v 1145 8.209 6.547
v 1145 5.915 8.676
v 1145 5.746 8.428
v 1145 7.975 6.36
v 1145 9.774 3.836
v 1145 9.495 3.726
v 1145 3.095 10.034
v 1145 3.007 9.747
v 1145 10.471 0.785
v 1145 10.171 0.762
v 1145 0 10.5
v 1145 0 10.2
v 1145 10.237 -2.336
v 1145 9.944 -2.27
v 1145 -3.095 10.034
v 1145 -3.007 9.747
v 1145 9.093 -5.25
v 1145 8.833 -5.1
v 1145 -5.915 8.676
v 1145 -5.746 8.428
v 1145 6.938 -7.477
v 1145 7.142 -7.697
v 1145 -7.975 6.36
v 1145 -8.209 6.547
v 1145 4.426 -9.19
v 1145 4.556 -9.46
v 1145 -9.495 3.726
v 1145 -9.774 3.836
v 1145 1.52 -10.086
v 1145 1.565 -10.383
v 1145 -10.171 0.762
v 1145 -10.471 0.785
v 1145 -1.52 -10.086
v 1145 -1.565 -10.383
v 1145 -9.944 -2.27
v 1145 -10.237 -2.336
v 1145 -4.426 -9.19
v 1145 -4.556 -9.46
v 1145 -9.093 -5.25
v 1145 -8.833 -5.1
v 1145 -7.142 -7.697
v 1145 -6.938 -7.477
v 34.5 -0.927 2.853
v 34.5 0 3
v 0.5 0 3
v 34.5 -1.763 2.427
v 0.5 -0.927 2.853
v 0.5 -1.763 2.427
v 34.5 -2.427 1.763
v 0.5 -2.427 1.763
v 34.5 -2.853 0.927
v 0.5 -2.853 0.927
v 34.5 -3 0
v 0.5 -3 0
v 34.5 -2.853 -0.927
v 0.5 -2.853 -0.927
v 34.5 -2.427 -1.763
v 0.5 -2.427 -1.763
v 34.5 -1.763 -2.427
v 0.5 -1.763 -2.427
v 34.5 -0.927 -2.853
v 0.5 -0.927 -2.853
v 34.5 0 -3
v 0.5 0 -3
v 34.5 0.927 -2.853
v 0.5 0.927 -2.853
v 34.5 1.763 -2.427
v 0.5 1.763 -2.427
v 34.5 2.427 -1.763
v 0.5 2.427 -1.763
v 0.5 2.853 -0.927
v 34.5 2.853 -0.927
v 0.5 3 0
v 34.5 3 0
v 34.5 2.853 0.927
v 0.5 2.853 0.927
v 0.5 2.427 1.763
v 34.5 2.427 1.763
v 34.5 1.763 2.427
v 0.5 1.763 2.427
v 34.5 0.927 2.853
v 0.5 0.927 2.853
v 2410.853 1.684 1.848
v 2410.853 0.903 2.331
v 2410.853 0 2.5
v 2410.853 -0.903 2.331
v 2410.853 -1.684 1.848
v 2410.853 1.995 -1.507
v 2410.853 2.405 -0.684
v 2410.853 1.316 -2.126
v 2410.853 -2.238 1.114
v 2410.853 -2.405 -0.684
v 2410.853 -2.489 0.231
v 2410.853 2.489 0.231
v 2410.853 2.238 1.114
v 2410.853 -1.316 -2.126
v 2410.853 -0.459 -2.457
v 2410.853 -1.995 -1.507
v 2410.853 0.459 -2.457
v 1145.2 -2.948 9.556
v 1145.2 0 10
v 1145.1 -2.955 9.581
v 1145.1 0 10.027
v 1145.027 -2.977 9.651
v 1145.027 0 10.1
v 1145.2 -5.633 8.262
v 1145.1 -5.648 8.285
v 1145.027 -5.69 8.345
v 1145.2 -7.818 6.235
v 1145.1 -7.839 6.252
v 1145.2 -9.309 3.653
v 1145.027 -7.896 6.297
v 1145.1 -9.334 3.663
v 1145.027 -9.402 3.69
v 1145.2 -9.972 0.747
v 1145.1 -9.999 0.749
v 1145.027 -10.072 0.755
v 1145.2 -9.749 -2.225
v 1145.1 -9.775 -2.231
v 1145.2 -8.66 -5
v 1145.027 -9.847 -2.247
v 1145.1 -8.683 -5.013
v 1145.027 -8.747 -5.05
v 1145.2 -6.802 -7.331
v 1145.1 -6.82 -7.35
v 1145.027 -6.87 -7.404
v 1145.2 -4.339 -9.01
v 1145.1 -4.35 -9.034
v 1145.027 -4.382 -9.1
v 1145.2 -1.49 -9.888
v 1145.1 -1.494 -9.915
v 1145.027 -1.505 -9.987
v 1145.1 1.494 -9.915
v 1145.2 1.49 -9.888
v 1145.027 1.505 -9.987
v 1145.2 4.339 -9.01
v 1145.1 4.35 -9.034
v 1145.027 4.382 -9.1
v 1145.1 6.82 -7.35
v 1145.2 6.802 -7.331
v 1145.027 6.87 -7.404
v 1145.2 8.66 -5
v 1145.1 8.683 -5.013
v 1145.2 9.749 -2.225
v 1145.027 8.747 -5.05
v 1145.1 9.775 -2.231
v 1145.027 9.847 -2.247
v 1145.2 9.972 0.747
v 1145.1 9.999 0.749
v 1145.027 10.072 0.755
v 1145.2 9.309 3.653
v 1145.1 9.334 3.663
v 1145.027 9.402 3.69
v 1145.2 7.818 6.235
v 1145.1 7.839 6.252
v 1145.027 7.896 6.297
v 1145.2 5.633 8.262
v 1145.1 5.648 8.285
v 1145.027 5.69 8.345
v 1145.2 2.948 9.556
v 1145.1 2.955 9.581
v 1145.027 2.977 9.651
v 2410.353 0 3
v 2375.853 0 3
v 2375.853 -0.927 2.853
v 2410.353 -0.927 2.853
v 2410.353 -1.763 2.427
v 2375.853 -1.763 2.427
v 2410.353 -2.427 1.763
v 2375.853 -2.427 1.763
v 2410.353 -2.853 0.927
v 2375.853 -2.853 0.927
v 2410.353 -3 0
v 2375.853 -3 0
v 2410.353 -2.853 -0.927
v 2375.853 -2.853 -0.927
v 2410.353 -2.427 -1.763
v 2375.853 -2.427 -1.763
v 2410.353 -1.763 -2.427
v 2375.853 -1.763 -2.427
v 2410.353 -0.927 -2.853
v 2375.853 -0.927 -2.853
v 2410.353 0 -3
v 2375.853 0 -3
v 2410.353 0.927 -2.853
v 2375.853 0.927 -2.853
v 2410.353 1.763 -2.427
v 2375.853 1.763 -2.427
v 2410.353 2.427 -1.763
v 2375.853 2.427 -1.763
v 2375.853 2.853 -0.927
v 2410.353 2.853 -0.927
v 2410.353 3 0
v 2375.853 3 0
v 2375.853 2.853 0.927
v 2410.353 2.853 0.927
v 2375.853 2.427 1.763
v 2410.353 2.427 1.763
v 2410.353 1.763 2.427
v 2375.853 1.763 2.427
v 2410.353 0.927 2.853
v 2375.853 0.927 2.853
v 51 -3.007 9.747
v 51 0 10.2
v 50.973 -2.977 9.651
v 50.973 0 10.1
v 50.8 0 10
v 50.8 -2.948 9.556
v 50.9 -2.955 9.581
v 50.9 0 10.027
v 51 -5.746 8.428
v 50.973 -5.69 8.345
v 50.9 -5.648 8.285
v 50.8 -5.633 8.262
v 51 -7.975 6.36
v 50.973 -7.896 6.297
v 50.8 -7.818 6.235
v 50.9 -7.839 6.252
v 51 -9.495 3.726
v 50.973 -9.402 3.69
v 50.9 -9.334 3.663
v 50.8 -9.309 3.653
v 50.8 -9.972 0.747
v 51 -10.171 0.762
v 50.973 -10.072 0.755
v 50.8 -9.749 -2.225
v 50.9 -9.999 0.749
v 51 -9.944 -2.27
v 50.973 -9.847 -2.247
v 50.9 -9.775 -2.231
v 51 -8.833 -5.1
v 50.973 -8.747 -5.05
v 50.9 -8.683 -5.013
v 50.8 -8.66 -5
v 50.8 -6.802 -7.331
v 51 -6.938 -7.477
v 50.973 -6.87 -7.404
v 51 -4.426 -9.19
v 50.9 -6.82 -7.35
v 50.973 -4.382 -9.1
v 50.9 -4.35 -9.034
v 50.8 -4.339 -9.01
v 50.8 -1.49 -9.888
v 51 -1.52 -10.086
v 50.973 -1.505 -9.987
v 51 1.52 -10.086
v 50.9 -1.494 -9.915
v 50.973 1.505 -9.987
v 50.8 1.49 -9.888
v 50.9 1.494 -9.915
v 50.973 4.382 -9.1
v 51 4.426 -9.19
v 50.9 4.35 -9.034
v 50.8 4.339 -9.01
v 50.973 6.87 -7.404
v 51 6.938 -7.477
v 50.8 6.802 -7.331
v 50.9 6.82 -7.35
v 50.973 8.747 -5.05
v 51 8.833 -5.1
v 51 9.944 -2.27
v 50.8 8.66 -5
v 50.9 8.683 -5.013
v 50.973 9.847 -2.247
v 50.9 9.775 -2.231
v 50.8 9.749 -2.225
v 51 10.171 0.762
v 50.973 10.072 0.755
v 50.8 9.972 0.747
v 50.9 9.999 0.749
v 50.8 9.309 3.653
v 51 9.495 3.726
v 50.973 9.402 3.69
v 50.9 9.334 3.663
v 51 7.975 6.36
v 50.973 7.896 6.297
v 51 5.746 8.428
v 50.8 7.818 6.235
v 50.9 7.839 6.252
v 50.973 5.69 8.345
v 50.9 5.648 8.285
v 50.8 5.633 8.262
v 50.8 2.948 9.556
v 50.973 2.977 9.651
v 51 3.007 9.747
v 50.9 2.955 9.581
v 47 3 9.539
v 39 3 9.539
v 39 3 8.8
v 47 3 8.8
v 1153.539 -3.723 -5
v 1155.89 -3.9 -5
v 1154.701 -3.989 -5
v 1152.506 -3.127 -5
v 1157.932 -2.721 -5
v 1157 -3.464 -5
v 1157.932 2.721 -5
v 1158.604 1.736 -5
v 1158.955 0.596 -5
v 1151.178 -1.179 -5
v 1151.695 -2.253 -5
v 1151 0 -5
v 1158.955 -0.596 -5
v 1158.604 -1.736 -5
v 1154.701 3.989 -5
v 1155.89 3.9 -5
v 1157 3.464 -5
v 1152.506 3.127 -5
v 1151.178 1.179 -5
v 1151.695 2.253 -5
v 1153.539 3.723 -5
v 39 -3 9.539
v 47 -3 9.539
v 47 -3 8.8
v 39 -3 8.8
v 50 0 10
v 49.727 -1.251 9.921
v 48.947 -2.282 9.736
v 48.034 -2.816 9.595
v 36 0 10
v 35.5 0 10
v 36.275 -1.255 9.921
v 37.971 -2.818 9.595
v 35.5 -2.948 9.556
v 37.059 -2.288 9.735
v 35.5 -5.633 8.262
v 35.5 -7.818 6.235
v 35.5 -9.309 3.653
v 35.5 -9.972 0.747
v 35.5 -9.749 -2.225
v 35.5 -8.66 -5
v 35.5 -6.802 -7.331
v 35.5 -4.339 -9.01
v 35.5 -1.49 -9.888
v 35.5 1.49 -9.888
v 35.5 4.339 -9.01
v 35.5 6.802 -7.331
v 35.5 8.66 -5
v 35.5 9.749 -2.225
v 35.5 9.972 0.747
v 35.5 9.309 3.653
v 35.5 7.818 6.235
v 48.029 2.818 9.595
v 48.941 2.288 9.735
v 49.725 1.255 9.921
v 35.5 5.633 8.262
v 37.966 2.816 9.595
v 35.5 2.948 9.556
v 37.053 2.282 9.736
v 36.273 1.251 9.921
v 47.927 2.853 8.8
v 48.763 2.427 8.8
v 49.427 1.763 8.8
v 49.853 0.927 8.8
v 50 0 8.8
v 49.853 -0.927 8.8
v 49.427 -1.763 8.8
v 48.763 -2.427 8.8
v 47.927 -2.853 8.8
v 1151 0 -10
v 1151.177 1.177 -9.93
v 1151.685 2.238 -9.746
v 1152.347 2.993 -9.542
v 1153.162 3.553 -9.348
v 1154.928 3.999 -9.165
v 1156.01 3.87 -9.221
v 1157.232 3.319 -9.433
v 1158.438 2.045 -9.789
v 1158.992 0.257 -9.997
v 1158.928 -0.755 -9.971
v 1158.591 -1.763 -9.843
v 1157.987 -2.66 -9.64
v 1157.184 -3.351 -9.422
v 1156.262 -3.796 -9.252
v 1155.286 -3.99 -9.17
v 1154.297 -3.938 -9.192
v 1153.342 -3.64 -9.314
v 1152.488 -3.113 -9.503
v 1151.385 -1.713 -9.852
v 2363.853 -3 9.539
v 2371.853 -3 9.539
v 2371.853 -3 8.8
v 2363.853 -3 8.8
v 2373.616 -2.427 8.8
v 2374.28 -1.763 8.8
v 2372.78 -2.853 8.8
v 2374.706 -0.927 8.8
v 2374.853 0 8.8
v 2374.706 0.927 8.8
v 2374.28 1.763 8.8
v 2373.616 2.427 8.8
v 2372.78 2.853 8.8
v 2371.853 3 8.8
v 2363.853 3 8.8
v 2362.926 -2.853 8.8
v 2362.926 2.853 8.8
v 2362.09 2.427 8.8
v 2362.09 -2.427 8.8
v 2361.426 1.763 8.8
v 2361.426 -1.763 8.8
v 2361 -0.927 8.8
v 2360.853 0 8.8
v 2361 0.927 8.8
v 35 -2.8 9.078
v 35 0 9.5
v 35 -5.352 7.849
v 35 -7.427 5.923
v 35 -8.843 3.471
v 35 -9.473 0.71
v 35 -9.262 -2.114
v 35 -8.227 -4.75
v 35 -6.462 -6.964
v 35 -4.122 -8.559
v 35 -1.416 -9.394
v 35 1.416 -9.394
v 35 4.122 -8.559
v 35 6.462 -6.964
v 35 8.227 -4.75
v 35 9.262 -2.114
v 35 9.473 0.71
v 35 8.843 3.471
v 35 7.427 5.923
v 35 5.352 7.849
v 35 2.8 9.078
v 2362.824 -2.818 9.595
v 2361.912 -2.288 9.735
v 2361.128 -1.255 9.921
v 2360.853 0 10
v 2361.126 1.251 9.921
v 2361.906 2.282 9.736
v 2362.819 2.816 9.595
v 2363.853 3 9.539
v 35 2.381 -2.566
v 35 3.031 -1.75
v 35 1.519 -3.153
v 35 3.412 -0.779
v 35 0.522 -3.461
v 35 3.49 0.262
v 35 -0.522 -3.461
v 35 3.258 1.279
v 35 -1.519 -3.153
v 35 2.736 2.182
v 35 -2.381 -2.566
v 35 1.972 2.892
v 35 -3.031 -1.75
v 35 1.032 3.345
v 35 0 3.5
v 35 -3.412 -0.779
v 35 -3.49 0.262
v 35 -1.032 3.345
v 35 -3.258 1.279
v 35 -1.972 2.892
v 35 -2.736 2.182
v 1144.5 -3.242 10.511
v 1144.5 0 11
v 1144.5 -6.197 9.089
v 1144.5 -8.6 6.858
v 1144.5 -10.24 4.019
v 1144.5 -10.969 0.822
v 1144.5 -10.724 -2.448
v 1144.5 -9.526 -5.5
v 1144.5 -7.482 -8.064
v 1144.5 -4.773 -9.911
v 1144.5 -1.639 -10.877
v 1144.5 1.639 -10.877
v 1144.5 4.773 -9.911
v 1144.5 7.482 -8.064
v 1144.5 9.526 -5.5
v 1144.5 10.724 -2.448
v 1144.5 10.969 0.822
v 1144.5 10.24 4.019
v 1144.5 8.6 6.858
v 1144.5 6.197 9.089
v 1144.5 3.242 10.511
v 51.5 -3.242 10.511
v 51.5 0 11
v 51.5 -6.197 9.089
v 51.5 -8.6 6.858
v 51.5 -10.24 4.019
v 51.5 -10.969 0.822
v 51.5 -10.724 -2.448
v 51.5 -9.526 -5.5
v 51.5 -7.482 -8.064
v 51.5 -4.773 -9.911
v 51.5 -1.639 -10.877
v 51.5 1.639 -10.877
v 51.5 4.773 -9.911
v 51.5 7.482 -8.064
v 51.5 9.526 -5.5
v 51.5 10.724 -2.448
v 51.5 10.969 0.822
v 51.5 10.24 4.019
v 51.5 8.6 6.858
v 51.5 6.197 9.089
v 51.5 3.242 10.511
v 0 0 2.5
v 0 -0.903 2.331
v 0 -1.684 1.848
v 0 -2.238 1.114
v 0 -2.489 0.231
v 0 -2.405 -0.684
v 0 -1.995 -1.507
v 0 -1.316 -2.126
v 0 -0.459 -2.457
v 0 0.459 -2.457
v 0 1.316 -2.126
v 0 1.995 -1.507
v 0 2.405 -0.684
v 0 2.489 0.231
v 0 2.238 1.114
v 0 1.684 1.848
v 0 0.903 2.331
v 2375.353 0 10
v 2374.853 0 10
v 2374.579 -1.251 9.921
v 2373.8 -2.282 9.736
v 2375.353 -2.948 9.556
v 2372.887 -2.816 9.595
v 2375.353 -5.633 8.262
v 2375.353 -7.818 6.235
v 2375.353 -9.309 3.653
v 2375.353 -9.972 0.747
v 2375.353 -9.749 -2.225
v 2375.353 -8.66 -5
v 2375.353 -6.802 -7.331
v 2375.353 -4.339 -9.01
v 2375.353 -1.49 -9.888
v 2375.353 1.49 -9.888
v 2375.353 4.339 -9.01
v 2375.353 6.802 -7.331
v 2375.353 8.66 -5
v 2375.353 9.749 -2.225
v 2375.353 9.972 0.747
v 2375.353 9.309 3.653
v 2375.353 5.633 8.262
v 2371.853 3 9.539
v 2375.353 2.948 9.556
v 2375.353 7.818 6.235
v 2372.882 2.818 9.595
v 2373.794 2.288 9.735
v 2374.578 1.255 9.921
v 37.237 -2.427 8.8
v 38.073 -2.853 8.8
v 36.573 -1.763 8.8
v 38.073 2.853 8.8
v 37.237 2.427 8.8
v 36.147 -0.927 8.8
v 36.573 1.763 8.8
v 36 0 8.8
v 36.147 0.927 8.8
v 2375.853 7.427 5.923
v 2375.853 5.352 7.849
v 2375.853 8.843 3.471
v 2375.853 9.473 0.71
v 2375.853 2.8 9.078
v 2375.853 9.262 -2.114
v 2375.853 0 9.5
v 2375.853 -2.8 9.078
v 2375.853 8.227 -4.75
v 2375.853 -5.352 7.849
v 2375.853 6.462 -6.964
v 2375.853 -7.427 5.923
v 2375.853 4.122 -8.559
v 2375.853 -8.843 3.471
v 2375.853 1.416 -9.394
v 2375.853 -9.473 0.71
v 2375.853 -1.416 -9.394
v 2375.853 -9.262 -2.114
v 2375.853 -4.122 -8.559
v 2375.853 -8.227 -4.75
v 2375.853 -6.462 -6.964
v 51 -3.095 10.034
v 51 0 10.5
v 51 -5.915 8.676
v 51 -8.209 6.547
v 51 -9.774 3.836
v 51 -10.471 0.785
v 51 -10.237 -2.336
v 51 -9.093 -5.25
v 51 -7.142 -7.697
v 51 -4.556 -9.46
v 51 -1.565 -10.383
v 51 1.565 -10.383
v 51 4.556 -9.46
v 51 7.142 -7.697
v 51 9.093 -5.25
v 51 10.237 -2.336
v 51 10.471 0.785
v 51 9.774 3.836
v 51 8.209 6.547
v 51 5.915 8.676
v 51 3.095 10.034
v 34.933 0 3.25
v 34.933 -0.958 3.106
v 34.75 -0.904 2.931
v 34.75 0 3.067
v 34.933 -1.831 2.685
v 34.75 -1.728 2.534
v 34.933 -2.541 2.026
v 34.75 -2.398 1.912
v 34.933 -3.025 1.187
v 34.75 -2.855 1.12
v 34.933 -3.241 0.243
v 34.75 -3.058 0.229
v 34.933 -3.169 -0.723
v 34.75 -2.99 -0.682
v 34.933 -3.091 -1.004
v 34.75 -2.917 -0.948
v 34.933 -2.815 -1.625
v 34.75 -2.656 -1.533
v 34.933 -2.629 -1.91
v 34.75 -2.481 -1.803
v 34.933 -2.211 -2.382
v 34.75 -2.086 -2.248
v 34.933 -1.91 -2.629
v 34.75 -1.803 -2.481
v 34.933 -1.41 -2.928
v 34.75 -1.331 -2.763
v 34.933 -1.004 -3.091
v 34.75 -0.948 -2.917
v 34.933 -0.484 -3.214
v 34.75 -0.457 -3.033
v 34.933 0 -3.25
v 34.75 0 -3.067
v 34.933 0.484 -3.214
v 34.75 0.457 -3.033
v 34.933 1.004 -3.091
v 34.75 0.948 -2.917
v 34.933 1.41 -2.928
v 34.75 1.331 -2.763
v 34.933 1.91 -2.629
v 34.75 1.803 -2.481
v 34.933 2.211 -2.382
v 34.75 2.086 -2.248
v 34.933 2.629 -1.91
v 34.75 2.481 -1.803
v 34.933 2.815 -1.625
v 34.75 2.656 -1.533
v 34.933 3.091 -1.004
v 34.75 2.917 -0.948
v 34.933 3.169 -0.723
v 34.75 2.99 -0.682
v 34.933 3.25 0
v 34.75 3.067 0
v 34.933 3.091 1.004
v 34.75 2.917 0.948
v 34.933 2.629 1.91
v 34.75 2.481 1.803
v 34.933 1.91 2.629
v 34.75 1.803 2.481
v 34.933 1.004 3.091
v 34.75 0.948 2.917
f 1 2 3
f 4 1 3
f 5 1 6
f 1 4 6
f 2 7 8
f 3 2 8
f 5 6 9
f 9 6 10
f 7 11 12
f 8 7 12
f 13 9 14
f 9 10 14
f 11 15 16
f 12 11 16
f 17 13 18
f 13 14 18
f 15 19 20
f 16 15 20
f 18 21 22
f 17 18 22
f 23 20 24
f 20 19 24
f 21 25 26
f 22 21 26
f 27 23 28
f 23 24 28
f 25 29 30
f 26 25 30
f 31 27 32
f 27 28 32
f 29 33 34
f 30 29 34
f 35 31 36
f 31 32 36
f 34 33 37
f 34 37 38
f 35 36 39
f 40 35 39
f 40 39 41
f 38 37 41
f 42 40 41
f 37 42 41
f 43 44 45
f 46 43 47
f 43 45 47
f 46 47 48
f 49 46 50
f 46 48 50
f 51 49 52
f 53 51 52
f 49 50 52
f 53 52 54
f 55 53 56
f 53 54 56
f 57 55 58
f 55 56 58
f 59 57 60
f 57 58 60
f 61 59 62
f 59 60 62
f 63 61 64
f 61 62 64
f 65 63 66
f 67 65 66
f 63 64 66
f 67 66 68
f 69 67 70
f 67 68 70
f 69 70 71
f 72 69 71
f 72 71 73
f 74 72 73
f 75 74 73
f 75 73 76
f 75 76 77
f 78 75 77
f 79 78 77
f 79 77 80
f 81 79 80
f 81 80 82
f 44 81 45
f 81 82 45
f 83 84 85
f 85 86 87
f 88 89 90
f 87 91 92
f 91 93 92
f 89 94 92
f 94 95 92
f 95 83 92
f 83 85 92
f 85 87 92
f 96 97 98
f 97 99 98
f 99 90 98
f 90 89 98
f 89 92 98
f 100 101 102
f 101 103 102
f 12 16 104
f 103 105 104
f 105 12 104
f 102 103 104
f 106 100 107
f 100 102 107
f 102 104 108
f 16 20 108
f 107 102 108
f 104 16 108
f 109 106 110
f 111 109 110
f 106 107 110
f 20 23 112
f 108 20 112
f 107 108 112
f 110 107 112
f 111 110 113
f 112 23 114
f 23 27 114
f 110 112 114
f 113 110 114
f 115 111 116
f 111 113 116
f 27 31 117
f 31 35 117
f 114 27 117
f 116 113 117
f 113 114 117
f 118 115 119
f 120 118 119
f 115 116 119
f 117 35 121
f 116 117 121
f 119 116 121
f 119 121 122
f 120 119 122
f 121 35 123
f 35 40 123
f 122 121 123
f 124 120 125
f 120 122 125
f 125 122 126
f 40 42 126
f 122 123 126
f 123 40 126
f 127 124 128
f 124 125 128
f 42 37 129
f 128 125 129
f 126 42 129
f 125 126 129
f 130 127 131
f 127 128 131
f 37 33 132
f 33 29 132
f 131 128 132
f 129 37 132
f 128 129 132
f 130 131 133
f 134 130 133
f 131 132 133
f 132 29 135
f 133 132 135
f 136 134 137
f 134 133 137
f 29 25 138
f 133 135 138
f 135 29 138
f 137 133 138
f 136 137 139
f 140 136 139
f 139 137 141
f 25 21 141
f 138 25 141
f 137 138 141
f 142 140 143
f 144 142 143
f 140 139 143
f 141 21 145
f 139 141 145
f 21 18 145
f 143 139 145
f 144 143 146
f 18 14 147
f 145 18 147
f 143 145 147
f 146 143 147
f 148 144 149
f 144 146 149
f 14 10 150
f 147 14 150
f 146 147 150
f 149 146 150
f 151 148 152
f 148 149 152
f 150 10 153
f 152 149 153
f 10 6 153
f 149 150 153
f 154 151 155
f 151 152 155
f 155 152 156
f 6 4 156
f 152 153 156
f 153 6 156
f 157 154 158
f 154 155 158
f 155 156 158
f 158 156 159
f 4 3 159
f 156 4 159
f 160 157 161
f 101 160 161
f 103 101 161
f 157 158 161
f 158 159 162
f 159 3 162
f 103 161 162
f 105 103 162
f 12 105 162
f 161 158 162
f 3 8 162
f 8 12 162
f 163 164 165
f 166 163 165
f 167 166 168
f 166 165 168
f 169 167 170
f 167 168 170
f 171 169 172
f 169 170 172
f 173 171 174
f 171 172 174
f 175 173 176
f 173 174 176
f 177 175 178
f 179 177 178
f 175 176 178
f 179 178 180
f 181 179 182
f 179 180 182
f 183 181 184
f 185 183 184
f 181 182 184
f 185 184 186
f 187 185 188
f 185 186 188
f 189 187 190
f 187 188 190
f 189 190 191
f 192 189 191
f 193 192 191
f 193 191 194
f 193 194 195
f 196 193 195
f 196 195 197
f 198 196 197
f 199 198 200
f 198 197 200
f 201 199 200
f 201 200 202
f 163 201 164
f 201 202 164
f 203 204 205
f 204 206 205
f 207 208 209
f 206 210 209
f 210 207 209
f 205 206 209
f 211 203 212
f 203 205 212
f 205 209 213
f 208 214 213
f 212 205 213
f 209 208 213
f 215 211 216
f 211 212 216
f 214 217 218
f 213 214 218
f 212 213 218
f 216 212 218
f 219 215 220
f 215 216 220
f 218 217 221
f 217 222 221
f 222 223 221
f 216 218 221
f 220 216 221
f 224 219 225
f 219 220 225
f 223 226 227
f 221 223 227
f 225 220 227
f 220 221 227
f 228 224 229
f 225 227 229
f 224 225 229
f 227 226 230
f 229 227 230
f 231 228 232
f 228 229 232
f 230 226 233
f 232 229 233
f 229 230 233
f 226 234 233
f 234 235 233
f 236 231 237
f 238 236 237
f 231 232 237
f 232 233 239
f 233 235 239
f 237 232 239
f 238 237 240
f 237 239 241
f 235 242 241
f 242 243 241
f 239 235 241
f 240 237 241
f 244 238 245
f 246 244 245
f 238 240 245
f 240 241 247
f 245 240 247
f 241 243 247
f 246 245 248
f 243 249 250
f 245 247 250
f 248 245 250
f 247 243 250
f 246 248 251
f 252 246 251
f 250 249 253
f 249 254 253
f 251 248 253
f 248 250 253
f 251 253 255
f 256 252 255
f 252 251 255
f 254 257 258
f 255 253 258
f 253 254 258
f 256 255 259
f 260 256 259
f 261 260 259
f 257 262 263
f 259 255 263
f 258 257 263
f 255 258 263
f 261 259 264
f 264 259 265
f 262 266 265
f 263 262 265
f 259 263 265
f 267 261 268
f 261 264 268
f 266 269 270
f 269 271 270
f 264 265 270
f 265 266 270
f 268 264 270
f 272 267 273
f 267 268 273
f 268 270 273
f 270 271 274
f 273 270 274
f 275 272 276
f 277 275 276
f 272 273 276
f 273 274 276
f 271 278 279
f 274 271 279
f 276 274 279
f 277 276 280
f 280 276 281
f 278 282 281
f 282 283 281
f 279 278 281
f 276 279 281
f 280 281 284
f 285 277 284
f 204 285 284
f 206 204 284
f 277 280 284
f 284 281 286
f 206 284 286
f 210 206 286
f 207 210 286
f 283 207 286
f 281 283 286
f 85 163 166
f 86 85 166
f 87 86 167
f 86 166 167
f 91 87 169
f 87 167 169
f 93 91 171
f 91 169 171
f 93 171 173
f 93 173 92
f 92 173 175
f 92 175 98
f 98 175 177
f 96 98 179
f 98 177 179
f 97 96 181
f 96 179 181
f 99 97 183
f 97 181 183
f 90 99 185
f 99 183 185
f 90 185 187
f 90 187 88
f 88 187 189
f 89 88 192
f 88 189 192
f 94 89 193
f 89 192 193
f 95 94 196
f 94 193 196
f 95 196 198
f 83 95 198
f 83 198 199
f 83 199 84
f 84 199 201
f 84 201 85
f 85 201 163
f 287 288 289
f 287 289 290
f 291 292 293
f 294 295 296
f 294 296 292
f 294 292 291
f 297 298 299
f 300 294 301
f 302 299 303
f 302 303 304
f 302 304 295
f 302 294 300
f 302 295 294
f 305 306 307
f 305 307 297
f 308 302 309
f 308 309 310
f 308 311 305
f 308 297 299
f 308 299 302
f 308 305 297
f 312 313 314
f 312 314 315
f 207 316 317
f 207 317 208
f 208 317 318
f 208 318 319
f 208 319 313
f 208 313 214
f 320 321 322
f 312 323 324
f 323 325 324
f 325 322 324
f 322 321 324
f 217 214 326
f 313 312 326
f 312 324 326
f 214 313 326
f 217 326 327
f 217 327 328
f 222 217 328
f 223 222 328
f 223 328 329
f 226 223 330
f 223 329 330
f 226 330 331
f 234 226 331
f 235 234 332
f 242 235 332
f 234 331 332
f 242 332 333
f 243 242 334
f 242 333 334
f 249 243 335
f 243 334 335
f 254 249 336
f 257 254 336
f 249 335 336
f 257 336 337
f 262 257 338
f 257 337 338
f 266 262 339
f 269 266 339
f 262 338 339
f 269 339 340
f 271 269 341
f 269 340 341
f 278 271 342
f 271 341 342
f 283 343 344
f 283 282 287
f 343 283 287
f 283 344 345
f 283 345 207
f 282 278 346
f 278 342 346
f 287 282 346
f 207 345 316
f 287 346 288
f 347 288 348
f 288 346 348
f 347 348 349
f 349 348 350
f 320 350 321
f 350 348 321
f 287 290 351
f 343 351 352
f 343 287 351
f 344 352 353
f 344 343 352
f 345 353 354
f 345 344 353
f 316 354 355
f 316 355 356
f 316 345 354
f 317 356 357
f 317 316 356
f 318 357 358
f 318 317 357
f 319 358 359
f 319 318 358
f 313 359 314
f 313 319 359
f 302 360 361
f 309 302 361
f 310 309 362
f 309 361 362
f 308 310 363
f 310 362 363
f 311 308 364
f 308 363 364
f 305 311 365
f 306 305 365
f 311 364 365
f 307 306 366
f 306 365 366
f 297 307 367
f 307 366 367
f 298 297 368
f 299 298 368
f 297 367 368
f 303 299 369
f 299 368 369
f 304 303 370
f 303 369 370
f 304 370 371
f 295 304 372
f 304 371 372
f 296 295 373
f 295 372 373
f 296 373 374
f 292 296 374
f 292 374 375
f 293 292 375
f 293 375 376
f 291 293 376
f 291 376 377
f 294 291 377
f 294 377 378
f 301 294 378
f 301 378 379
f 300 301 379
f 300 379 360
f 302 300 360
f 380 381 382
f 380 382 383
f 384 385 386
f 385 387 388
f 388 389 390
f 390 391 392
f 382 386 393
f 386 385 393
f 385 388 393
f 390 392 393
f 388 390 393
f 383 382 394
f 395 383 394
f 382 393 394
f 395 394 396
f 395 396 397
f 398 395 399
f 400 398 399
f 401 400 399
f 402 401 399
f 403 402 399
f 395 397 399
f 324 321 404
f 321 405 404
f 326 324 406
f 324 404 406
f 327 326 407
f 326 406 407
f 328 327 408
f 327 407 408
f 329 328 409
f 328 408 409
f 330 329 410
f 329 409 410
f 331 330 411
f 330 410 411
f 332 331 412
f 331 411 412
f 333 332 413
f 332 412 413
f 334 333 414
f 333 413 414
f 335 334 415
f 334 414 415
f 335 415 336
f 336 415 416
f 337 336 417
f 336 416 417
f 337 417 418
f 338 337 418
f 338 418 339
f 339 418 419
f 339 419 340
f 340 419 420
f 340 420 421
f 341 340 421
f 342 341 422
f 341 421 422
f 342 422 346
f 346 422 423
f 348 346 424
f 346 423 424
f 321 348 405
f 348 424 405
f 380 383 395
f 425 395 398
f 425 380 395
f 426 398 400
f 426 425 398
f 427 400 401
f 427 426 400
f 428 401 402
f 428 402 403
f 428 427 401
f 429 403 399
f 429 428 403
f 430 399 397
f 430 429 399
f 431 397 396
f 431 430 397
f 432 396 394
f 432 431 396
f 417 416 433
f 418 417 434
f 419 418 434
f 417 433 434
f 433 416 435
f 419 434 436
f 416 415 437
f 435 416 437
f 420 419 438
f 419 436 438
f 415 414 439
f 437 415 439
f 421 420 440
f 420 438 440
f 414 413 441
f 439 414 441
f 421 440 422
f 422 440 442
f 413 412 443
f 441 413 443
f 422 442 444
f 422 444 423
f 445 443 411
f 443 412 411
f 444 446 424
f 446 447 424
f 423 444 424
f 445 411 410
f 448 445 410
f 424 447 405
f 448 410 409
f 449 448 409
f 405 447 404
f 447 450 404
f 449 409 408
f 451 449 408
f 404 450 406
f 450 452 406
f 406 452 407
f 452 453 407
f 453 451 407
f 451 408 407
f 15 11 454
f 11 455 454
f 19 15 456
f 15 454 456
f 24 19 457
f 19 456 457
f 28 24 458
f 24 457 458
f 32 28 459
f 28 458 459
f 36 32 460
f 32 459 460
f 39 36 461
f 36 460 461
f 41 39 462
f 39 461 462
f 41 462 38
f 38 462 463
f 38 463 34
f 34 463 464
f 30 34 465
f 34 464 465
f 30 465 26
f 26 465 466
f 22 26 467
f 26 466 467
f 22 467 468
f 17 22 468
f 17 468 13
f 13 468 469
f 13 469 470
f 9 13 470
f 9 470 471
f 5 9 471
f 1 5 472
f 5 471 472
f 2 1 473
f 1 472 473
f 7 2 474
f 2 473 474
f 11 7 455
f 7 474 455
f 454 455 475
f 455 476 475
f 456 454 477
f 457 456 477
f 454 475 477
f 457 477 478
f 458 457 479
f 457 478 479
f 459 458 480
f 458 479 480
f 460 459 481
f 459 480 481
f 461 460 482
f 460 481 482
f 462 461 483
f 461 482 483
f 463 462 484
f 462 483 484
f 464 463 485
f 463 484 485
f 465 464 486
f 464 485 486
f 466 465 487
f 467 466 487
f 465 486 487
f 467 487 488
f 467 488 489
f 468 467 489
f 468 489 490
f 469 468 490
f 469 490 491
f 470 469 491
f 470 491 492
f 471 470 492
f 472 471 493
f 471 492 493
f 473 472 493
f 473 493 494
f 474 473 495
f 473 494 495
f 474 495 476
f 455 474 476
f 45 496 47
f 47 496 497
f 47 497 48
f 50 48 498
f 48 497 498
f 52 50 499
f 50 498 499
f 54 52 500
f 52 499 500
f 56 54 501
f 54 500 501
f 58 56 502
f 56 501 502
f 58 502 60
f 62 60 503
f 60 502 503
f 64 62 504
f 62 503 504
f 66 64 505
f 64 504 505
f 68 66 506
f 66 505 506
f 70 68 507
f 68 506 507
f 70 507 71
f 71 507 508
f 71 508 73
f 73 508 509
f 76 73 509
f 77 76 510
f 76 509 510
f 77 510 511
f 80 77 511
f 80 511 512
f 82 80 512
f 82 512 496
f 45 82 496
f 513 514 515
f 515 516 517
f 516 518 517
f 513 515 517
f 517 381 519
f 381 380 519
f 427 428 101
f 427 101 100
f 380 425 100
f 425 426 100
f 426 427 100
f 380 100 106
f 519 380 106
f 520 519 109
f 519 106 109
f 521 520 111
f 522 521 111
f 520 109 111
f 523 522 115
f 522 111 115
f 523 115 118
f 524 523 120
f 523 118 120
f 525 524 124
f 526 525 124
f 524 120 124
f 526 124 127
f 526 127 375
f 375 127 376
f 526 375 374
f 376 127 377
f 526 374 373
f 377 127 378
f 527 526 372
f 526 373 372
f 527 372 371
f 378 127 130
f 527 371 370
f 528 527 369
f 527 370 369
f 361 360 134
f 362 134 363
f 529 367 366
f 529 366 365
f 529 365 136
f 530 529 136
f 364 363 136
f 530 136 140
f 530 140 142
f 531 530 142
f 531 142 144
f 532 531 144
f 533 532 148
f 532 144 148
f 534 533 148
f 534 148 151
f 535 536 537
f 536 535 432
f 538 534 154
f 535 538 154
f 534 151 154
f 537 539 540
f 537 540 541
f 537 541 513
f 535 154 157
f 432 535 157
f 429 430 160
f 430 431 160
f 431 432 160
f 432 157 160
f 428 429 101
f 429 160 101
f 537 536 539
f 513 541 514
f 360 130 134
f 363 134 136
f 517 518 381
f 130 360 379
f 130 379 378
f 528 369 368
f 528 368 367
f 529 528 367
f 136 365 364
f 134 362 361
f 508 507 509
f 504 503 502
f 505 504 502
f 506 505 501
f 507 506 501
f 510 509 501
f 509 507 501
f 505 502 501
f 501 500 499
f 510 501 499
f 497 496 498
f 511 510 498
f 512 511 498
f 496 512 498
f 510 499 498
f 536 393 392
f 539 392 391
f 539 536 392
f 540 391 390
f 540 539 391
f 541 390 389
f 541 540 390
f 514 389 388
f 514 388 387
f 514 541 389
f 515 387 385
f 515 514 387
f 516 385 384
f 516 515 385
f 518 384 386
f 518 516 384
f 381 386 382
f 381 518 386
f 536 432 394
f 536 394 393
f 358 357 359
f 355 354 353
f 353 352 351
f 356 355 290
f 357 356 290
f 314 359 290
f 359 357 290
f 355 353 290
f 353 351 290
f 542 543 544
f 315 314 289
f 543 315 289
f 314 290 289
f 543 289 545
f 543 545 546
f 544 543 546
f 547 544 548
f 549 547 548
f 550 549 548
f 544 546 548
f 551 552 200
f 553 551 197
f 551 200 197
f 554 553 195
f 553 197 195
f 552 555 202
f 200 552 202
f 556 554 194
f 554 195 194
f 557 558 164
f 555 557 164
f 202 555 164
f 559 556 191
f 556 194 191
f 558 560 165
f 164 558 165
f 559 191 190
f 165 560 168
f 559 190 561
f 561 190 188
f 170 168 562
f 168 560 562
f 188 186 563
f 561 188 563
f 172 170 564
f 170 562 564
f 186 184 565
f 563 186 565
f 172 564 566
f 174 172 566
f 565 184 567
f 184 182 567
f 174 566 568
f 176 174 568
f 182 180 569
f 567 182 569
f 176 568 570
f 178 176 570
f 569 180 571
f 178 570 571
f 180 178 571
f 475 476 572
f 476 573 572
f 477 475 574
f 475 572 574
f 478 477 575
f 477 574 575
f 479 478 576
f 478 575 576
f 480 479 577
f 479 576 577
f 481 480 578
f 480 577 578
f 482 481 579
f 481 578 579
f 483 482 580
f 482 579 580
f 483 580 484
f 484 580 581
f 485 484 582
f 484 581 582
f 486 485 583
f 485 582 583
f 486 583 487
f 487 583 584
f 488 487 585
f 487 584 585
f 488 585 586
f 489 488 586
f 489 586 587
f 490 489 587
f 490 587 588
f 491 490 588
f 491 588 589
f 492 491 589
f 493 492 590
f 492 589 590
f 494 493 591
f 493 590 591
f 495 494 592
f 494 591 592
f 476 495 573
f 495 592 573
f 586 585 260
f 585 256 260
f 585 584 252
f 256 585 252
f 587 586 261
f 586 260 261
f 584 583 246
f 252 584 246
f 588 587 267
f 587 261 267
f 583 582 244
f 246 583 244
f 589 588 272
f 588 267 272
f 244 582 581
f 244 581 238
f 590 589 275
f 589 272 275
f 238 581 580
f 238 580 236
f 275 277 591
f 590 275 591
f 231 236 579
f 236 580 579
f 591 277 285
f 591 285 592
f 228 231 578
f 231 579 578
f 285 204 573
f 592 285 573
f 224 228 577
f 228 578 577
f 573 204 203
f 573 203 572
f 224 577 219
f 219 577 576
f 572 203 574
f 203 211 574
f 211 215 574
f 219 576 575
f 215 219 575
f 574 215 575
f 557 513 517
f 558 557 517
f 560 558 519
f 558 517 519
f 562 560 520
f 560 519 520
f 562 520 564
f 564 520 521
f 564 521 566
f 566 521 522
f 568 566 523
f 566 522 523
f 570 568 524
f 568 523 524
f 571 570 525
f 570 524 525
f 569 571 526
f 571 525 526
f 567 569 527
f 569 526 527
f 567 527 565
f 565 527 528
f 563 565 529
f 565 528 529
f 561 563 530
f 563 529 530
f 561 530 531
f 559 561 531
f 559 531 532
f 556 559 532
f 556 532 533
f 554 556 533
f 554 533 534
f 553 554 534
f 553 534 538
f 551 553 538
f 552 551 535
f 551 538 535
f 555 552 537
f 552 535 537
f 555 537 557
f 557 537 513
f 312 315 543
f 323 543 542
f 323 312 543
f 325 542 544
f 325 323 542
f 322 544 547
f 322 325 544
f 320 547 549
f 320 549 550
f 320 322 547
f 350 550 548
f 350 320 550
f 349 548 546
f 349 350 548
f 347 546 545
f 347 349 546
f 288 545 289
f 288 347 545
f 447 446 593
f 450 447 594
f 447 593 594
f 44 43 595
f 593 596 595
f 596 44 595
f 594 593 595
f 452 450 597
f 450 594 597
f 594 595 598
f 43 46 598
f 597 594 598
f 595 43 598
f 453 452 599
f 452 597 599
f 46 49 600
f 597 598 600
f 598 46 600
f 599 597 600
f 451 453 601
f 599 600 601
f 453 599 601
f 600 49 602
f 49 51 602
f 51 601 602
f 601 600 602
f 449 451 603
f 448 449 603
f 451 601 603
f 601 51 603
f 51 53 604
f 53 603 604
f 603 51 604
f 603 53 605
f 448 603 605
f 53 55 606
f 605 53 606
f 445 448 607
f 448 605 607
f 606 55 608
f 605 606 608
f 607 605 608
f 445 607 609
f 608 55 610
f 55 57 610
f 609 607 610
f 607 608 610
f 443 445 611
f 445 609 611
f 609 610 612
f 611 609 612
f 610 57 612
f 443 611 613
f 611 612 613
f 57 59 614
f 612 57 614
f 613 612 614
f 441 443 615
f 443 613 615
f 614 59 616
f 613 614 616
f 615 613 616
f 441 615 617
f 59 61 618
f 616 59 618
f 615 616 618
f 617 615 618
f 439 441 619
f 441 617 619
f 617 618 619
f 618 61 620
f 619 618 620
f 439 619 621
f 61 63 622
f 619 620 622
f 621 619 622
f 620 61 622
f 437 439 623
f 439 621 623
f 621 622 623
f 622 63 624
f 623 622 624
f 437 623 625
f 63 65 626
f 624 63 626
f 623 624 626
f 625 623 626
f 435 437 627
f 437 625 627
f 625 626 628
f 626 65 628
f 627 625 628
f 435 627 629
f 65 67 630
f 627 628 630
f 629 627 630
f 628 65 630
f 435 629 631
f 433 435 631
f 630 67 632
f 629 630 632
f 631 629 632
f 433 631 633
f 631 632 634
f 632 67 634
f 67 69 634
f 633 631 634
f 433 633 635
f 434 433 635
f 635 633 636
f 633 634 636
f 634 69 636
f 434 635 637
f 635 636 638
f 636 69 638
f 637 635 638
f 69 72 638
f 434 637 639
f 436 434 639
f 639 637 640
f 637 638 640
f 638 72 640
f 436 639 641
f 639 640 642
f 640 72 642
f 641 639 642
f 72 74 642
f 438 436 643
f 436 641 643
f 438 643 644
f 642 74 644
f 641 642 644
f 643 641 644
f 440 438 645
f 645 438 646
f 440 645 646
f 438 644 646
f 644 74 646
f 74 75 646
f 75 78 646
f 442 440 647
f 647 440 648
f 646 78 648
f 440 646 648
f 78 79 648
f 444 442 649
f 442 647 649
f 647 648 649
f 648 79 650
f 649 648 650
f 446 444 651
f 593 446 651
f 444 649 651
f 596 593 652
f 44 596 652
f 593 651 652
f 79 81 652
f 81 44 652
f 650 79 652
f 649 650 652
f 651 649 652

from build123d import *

# Parameters (mm, degrees)
CHAMFER_1_SIZE      = 0.5
CUT_EXTRUDE_1_DEPTH = 1.2
SKETCH_5_R          = 4
CUT_EXTRUDE_2_DEPTH = 5
CUT_EXTRUDE_3_DEPTH = 1.2


with BuildPart() as part:
    # Эскиз1 → Повернуть1 (revolve)
    with BuildSketch(Plane.XY):
        with BuildLine():
            Line((0, 2.5), (0, 0))
            Line((0, 0), (721.167070453, 0))
            Line((721.167070453, 0), (1185.852894625, 0))
            Line((1185.852894625, 0), (2359.852894625, 0))
            Line((2359.852894625, 0), (2410.852894625, 0))
            Line((2410.852894625, 0), (2410.852894625, 3))
            Line((2410.852894625, 3), (2375.852894625, 3))
            Line((2375.852894625, 3), (2375.852894625, 10))
            Line((2375.852894625, 10), (2359.852894625, 10))
            Line((2359.852894625, 10), (1206.852894625, 10))
            Line((1206.852894625, 10), (1185.852894625, 10))
            Line((1185.852894625, 10), (1145.2, 10))
            ThreePointArc((1145.2, 10), (1145.058578644, 10.058578644), (1145, 10.2))
            Line((1145, 10.2), (1145, 10.5))
            Line((1145, 10.5), (1144.5, 11))
            Line((1144.5, 11), (51.5, 11))
            Line((51.5, 11), (51, 10.5))
            Line((51, 10.5), (51, 10.2))
            ThreePointArc((51, 10.2), (50.941421356, 10.058578644), (50.8, 10))
            Line((50.8, 10), (35.5, 10))
            Line((35.5, 10), (35, 9.5))
            Line((35, 9.5), (35, 3.5))
            ThreePointArc((35, 3.5), (34.853553391, 3.146446609), (34.5, 3))
            Line((34.5, 3), (0.5, 3))
            Line((0.5, 3), (0, 2.5))
        make_face()
    revolve(axis=Axis((0, 0, 0), (1, 0, 0)))

    # Фаска1
    chamfer_1_edges = [part.edges().sort_by_distance(p)[0] for p in [
        (2375.852894625, -10, 0),
        (2410.852894625, -3, 0),
    ]]
    chamfer(chamfer_1_edges, length=CHAMFER_1_SIZE)

    # Эскиз3 → Вырез-Вытянуть1 (cut)
    with BuildSketch(Plane.XY.offset(10)):
        with BuildLine():
            Line((39, 3), (47, 3))
            ThreePointArc((47, 3), (50, 0), (47, -3))
            Line((47, -3), (39, -3))
            ThreePointArc((39, -3), (36, 0), (39, 3))
        make_face()
    extrude(amount=-CUT_EXTRUDE_1_DEPTH, mode=Mode.SUBTRACT)

    # Эскиз5 → Вырез-Вытянуть2 (cut)
    with BuildSketch(Plane(origin=(0, 0, -10), x_dir=(-1, 0, 0), z_dir=(0, 0, -1))):
        with Locations((-1155, 0)):
            Circle(SKETCH_5_R)
    extrude(amount=-CUT_EXTRUDE_2_DEPTH, mode=Mode.SUBTRACT)

    # Эскиз6 → Вырез-Вытянуть3 (cut)
    with BuildSketch(Plane.XY.offset(10)):
        with BuildLine():
            Line((2363.852894625, 3), (2371.852894625, 3))
            ThreePointArc((2371.852894625, 3), (2374.852894625, 0), (2371.852894625, -3))
            Line((2371.852894625, -3), (2363.852894625, -3))
            ThreePointArc((2363.852894625, -3), (2360.852894625, 0), (2363.852894625, 3))
        make_face()
    extrude(amount=-CUT_EXTRUDE_3_DEPTH, mode=Mode.SUBTRACT)


solid = part.part
